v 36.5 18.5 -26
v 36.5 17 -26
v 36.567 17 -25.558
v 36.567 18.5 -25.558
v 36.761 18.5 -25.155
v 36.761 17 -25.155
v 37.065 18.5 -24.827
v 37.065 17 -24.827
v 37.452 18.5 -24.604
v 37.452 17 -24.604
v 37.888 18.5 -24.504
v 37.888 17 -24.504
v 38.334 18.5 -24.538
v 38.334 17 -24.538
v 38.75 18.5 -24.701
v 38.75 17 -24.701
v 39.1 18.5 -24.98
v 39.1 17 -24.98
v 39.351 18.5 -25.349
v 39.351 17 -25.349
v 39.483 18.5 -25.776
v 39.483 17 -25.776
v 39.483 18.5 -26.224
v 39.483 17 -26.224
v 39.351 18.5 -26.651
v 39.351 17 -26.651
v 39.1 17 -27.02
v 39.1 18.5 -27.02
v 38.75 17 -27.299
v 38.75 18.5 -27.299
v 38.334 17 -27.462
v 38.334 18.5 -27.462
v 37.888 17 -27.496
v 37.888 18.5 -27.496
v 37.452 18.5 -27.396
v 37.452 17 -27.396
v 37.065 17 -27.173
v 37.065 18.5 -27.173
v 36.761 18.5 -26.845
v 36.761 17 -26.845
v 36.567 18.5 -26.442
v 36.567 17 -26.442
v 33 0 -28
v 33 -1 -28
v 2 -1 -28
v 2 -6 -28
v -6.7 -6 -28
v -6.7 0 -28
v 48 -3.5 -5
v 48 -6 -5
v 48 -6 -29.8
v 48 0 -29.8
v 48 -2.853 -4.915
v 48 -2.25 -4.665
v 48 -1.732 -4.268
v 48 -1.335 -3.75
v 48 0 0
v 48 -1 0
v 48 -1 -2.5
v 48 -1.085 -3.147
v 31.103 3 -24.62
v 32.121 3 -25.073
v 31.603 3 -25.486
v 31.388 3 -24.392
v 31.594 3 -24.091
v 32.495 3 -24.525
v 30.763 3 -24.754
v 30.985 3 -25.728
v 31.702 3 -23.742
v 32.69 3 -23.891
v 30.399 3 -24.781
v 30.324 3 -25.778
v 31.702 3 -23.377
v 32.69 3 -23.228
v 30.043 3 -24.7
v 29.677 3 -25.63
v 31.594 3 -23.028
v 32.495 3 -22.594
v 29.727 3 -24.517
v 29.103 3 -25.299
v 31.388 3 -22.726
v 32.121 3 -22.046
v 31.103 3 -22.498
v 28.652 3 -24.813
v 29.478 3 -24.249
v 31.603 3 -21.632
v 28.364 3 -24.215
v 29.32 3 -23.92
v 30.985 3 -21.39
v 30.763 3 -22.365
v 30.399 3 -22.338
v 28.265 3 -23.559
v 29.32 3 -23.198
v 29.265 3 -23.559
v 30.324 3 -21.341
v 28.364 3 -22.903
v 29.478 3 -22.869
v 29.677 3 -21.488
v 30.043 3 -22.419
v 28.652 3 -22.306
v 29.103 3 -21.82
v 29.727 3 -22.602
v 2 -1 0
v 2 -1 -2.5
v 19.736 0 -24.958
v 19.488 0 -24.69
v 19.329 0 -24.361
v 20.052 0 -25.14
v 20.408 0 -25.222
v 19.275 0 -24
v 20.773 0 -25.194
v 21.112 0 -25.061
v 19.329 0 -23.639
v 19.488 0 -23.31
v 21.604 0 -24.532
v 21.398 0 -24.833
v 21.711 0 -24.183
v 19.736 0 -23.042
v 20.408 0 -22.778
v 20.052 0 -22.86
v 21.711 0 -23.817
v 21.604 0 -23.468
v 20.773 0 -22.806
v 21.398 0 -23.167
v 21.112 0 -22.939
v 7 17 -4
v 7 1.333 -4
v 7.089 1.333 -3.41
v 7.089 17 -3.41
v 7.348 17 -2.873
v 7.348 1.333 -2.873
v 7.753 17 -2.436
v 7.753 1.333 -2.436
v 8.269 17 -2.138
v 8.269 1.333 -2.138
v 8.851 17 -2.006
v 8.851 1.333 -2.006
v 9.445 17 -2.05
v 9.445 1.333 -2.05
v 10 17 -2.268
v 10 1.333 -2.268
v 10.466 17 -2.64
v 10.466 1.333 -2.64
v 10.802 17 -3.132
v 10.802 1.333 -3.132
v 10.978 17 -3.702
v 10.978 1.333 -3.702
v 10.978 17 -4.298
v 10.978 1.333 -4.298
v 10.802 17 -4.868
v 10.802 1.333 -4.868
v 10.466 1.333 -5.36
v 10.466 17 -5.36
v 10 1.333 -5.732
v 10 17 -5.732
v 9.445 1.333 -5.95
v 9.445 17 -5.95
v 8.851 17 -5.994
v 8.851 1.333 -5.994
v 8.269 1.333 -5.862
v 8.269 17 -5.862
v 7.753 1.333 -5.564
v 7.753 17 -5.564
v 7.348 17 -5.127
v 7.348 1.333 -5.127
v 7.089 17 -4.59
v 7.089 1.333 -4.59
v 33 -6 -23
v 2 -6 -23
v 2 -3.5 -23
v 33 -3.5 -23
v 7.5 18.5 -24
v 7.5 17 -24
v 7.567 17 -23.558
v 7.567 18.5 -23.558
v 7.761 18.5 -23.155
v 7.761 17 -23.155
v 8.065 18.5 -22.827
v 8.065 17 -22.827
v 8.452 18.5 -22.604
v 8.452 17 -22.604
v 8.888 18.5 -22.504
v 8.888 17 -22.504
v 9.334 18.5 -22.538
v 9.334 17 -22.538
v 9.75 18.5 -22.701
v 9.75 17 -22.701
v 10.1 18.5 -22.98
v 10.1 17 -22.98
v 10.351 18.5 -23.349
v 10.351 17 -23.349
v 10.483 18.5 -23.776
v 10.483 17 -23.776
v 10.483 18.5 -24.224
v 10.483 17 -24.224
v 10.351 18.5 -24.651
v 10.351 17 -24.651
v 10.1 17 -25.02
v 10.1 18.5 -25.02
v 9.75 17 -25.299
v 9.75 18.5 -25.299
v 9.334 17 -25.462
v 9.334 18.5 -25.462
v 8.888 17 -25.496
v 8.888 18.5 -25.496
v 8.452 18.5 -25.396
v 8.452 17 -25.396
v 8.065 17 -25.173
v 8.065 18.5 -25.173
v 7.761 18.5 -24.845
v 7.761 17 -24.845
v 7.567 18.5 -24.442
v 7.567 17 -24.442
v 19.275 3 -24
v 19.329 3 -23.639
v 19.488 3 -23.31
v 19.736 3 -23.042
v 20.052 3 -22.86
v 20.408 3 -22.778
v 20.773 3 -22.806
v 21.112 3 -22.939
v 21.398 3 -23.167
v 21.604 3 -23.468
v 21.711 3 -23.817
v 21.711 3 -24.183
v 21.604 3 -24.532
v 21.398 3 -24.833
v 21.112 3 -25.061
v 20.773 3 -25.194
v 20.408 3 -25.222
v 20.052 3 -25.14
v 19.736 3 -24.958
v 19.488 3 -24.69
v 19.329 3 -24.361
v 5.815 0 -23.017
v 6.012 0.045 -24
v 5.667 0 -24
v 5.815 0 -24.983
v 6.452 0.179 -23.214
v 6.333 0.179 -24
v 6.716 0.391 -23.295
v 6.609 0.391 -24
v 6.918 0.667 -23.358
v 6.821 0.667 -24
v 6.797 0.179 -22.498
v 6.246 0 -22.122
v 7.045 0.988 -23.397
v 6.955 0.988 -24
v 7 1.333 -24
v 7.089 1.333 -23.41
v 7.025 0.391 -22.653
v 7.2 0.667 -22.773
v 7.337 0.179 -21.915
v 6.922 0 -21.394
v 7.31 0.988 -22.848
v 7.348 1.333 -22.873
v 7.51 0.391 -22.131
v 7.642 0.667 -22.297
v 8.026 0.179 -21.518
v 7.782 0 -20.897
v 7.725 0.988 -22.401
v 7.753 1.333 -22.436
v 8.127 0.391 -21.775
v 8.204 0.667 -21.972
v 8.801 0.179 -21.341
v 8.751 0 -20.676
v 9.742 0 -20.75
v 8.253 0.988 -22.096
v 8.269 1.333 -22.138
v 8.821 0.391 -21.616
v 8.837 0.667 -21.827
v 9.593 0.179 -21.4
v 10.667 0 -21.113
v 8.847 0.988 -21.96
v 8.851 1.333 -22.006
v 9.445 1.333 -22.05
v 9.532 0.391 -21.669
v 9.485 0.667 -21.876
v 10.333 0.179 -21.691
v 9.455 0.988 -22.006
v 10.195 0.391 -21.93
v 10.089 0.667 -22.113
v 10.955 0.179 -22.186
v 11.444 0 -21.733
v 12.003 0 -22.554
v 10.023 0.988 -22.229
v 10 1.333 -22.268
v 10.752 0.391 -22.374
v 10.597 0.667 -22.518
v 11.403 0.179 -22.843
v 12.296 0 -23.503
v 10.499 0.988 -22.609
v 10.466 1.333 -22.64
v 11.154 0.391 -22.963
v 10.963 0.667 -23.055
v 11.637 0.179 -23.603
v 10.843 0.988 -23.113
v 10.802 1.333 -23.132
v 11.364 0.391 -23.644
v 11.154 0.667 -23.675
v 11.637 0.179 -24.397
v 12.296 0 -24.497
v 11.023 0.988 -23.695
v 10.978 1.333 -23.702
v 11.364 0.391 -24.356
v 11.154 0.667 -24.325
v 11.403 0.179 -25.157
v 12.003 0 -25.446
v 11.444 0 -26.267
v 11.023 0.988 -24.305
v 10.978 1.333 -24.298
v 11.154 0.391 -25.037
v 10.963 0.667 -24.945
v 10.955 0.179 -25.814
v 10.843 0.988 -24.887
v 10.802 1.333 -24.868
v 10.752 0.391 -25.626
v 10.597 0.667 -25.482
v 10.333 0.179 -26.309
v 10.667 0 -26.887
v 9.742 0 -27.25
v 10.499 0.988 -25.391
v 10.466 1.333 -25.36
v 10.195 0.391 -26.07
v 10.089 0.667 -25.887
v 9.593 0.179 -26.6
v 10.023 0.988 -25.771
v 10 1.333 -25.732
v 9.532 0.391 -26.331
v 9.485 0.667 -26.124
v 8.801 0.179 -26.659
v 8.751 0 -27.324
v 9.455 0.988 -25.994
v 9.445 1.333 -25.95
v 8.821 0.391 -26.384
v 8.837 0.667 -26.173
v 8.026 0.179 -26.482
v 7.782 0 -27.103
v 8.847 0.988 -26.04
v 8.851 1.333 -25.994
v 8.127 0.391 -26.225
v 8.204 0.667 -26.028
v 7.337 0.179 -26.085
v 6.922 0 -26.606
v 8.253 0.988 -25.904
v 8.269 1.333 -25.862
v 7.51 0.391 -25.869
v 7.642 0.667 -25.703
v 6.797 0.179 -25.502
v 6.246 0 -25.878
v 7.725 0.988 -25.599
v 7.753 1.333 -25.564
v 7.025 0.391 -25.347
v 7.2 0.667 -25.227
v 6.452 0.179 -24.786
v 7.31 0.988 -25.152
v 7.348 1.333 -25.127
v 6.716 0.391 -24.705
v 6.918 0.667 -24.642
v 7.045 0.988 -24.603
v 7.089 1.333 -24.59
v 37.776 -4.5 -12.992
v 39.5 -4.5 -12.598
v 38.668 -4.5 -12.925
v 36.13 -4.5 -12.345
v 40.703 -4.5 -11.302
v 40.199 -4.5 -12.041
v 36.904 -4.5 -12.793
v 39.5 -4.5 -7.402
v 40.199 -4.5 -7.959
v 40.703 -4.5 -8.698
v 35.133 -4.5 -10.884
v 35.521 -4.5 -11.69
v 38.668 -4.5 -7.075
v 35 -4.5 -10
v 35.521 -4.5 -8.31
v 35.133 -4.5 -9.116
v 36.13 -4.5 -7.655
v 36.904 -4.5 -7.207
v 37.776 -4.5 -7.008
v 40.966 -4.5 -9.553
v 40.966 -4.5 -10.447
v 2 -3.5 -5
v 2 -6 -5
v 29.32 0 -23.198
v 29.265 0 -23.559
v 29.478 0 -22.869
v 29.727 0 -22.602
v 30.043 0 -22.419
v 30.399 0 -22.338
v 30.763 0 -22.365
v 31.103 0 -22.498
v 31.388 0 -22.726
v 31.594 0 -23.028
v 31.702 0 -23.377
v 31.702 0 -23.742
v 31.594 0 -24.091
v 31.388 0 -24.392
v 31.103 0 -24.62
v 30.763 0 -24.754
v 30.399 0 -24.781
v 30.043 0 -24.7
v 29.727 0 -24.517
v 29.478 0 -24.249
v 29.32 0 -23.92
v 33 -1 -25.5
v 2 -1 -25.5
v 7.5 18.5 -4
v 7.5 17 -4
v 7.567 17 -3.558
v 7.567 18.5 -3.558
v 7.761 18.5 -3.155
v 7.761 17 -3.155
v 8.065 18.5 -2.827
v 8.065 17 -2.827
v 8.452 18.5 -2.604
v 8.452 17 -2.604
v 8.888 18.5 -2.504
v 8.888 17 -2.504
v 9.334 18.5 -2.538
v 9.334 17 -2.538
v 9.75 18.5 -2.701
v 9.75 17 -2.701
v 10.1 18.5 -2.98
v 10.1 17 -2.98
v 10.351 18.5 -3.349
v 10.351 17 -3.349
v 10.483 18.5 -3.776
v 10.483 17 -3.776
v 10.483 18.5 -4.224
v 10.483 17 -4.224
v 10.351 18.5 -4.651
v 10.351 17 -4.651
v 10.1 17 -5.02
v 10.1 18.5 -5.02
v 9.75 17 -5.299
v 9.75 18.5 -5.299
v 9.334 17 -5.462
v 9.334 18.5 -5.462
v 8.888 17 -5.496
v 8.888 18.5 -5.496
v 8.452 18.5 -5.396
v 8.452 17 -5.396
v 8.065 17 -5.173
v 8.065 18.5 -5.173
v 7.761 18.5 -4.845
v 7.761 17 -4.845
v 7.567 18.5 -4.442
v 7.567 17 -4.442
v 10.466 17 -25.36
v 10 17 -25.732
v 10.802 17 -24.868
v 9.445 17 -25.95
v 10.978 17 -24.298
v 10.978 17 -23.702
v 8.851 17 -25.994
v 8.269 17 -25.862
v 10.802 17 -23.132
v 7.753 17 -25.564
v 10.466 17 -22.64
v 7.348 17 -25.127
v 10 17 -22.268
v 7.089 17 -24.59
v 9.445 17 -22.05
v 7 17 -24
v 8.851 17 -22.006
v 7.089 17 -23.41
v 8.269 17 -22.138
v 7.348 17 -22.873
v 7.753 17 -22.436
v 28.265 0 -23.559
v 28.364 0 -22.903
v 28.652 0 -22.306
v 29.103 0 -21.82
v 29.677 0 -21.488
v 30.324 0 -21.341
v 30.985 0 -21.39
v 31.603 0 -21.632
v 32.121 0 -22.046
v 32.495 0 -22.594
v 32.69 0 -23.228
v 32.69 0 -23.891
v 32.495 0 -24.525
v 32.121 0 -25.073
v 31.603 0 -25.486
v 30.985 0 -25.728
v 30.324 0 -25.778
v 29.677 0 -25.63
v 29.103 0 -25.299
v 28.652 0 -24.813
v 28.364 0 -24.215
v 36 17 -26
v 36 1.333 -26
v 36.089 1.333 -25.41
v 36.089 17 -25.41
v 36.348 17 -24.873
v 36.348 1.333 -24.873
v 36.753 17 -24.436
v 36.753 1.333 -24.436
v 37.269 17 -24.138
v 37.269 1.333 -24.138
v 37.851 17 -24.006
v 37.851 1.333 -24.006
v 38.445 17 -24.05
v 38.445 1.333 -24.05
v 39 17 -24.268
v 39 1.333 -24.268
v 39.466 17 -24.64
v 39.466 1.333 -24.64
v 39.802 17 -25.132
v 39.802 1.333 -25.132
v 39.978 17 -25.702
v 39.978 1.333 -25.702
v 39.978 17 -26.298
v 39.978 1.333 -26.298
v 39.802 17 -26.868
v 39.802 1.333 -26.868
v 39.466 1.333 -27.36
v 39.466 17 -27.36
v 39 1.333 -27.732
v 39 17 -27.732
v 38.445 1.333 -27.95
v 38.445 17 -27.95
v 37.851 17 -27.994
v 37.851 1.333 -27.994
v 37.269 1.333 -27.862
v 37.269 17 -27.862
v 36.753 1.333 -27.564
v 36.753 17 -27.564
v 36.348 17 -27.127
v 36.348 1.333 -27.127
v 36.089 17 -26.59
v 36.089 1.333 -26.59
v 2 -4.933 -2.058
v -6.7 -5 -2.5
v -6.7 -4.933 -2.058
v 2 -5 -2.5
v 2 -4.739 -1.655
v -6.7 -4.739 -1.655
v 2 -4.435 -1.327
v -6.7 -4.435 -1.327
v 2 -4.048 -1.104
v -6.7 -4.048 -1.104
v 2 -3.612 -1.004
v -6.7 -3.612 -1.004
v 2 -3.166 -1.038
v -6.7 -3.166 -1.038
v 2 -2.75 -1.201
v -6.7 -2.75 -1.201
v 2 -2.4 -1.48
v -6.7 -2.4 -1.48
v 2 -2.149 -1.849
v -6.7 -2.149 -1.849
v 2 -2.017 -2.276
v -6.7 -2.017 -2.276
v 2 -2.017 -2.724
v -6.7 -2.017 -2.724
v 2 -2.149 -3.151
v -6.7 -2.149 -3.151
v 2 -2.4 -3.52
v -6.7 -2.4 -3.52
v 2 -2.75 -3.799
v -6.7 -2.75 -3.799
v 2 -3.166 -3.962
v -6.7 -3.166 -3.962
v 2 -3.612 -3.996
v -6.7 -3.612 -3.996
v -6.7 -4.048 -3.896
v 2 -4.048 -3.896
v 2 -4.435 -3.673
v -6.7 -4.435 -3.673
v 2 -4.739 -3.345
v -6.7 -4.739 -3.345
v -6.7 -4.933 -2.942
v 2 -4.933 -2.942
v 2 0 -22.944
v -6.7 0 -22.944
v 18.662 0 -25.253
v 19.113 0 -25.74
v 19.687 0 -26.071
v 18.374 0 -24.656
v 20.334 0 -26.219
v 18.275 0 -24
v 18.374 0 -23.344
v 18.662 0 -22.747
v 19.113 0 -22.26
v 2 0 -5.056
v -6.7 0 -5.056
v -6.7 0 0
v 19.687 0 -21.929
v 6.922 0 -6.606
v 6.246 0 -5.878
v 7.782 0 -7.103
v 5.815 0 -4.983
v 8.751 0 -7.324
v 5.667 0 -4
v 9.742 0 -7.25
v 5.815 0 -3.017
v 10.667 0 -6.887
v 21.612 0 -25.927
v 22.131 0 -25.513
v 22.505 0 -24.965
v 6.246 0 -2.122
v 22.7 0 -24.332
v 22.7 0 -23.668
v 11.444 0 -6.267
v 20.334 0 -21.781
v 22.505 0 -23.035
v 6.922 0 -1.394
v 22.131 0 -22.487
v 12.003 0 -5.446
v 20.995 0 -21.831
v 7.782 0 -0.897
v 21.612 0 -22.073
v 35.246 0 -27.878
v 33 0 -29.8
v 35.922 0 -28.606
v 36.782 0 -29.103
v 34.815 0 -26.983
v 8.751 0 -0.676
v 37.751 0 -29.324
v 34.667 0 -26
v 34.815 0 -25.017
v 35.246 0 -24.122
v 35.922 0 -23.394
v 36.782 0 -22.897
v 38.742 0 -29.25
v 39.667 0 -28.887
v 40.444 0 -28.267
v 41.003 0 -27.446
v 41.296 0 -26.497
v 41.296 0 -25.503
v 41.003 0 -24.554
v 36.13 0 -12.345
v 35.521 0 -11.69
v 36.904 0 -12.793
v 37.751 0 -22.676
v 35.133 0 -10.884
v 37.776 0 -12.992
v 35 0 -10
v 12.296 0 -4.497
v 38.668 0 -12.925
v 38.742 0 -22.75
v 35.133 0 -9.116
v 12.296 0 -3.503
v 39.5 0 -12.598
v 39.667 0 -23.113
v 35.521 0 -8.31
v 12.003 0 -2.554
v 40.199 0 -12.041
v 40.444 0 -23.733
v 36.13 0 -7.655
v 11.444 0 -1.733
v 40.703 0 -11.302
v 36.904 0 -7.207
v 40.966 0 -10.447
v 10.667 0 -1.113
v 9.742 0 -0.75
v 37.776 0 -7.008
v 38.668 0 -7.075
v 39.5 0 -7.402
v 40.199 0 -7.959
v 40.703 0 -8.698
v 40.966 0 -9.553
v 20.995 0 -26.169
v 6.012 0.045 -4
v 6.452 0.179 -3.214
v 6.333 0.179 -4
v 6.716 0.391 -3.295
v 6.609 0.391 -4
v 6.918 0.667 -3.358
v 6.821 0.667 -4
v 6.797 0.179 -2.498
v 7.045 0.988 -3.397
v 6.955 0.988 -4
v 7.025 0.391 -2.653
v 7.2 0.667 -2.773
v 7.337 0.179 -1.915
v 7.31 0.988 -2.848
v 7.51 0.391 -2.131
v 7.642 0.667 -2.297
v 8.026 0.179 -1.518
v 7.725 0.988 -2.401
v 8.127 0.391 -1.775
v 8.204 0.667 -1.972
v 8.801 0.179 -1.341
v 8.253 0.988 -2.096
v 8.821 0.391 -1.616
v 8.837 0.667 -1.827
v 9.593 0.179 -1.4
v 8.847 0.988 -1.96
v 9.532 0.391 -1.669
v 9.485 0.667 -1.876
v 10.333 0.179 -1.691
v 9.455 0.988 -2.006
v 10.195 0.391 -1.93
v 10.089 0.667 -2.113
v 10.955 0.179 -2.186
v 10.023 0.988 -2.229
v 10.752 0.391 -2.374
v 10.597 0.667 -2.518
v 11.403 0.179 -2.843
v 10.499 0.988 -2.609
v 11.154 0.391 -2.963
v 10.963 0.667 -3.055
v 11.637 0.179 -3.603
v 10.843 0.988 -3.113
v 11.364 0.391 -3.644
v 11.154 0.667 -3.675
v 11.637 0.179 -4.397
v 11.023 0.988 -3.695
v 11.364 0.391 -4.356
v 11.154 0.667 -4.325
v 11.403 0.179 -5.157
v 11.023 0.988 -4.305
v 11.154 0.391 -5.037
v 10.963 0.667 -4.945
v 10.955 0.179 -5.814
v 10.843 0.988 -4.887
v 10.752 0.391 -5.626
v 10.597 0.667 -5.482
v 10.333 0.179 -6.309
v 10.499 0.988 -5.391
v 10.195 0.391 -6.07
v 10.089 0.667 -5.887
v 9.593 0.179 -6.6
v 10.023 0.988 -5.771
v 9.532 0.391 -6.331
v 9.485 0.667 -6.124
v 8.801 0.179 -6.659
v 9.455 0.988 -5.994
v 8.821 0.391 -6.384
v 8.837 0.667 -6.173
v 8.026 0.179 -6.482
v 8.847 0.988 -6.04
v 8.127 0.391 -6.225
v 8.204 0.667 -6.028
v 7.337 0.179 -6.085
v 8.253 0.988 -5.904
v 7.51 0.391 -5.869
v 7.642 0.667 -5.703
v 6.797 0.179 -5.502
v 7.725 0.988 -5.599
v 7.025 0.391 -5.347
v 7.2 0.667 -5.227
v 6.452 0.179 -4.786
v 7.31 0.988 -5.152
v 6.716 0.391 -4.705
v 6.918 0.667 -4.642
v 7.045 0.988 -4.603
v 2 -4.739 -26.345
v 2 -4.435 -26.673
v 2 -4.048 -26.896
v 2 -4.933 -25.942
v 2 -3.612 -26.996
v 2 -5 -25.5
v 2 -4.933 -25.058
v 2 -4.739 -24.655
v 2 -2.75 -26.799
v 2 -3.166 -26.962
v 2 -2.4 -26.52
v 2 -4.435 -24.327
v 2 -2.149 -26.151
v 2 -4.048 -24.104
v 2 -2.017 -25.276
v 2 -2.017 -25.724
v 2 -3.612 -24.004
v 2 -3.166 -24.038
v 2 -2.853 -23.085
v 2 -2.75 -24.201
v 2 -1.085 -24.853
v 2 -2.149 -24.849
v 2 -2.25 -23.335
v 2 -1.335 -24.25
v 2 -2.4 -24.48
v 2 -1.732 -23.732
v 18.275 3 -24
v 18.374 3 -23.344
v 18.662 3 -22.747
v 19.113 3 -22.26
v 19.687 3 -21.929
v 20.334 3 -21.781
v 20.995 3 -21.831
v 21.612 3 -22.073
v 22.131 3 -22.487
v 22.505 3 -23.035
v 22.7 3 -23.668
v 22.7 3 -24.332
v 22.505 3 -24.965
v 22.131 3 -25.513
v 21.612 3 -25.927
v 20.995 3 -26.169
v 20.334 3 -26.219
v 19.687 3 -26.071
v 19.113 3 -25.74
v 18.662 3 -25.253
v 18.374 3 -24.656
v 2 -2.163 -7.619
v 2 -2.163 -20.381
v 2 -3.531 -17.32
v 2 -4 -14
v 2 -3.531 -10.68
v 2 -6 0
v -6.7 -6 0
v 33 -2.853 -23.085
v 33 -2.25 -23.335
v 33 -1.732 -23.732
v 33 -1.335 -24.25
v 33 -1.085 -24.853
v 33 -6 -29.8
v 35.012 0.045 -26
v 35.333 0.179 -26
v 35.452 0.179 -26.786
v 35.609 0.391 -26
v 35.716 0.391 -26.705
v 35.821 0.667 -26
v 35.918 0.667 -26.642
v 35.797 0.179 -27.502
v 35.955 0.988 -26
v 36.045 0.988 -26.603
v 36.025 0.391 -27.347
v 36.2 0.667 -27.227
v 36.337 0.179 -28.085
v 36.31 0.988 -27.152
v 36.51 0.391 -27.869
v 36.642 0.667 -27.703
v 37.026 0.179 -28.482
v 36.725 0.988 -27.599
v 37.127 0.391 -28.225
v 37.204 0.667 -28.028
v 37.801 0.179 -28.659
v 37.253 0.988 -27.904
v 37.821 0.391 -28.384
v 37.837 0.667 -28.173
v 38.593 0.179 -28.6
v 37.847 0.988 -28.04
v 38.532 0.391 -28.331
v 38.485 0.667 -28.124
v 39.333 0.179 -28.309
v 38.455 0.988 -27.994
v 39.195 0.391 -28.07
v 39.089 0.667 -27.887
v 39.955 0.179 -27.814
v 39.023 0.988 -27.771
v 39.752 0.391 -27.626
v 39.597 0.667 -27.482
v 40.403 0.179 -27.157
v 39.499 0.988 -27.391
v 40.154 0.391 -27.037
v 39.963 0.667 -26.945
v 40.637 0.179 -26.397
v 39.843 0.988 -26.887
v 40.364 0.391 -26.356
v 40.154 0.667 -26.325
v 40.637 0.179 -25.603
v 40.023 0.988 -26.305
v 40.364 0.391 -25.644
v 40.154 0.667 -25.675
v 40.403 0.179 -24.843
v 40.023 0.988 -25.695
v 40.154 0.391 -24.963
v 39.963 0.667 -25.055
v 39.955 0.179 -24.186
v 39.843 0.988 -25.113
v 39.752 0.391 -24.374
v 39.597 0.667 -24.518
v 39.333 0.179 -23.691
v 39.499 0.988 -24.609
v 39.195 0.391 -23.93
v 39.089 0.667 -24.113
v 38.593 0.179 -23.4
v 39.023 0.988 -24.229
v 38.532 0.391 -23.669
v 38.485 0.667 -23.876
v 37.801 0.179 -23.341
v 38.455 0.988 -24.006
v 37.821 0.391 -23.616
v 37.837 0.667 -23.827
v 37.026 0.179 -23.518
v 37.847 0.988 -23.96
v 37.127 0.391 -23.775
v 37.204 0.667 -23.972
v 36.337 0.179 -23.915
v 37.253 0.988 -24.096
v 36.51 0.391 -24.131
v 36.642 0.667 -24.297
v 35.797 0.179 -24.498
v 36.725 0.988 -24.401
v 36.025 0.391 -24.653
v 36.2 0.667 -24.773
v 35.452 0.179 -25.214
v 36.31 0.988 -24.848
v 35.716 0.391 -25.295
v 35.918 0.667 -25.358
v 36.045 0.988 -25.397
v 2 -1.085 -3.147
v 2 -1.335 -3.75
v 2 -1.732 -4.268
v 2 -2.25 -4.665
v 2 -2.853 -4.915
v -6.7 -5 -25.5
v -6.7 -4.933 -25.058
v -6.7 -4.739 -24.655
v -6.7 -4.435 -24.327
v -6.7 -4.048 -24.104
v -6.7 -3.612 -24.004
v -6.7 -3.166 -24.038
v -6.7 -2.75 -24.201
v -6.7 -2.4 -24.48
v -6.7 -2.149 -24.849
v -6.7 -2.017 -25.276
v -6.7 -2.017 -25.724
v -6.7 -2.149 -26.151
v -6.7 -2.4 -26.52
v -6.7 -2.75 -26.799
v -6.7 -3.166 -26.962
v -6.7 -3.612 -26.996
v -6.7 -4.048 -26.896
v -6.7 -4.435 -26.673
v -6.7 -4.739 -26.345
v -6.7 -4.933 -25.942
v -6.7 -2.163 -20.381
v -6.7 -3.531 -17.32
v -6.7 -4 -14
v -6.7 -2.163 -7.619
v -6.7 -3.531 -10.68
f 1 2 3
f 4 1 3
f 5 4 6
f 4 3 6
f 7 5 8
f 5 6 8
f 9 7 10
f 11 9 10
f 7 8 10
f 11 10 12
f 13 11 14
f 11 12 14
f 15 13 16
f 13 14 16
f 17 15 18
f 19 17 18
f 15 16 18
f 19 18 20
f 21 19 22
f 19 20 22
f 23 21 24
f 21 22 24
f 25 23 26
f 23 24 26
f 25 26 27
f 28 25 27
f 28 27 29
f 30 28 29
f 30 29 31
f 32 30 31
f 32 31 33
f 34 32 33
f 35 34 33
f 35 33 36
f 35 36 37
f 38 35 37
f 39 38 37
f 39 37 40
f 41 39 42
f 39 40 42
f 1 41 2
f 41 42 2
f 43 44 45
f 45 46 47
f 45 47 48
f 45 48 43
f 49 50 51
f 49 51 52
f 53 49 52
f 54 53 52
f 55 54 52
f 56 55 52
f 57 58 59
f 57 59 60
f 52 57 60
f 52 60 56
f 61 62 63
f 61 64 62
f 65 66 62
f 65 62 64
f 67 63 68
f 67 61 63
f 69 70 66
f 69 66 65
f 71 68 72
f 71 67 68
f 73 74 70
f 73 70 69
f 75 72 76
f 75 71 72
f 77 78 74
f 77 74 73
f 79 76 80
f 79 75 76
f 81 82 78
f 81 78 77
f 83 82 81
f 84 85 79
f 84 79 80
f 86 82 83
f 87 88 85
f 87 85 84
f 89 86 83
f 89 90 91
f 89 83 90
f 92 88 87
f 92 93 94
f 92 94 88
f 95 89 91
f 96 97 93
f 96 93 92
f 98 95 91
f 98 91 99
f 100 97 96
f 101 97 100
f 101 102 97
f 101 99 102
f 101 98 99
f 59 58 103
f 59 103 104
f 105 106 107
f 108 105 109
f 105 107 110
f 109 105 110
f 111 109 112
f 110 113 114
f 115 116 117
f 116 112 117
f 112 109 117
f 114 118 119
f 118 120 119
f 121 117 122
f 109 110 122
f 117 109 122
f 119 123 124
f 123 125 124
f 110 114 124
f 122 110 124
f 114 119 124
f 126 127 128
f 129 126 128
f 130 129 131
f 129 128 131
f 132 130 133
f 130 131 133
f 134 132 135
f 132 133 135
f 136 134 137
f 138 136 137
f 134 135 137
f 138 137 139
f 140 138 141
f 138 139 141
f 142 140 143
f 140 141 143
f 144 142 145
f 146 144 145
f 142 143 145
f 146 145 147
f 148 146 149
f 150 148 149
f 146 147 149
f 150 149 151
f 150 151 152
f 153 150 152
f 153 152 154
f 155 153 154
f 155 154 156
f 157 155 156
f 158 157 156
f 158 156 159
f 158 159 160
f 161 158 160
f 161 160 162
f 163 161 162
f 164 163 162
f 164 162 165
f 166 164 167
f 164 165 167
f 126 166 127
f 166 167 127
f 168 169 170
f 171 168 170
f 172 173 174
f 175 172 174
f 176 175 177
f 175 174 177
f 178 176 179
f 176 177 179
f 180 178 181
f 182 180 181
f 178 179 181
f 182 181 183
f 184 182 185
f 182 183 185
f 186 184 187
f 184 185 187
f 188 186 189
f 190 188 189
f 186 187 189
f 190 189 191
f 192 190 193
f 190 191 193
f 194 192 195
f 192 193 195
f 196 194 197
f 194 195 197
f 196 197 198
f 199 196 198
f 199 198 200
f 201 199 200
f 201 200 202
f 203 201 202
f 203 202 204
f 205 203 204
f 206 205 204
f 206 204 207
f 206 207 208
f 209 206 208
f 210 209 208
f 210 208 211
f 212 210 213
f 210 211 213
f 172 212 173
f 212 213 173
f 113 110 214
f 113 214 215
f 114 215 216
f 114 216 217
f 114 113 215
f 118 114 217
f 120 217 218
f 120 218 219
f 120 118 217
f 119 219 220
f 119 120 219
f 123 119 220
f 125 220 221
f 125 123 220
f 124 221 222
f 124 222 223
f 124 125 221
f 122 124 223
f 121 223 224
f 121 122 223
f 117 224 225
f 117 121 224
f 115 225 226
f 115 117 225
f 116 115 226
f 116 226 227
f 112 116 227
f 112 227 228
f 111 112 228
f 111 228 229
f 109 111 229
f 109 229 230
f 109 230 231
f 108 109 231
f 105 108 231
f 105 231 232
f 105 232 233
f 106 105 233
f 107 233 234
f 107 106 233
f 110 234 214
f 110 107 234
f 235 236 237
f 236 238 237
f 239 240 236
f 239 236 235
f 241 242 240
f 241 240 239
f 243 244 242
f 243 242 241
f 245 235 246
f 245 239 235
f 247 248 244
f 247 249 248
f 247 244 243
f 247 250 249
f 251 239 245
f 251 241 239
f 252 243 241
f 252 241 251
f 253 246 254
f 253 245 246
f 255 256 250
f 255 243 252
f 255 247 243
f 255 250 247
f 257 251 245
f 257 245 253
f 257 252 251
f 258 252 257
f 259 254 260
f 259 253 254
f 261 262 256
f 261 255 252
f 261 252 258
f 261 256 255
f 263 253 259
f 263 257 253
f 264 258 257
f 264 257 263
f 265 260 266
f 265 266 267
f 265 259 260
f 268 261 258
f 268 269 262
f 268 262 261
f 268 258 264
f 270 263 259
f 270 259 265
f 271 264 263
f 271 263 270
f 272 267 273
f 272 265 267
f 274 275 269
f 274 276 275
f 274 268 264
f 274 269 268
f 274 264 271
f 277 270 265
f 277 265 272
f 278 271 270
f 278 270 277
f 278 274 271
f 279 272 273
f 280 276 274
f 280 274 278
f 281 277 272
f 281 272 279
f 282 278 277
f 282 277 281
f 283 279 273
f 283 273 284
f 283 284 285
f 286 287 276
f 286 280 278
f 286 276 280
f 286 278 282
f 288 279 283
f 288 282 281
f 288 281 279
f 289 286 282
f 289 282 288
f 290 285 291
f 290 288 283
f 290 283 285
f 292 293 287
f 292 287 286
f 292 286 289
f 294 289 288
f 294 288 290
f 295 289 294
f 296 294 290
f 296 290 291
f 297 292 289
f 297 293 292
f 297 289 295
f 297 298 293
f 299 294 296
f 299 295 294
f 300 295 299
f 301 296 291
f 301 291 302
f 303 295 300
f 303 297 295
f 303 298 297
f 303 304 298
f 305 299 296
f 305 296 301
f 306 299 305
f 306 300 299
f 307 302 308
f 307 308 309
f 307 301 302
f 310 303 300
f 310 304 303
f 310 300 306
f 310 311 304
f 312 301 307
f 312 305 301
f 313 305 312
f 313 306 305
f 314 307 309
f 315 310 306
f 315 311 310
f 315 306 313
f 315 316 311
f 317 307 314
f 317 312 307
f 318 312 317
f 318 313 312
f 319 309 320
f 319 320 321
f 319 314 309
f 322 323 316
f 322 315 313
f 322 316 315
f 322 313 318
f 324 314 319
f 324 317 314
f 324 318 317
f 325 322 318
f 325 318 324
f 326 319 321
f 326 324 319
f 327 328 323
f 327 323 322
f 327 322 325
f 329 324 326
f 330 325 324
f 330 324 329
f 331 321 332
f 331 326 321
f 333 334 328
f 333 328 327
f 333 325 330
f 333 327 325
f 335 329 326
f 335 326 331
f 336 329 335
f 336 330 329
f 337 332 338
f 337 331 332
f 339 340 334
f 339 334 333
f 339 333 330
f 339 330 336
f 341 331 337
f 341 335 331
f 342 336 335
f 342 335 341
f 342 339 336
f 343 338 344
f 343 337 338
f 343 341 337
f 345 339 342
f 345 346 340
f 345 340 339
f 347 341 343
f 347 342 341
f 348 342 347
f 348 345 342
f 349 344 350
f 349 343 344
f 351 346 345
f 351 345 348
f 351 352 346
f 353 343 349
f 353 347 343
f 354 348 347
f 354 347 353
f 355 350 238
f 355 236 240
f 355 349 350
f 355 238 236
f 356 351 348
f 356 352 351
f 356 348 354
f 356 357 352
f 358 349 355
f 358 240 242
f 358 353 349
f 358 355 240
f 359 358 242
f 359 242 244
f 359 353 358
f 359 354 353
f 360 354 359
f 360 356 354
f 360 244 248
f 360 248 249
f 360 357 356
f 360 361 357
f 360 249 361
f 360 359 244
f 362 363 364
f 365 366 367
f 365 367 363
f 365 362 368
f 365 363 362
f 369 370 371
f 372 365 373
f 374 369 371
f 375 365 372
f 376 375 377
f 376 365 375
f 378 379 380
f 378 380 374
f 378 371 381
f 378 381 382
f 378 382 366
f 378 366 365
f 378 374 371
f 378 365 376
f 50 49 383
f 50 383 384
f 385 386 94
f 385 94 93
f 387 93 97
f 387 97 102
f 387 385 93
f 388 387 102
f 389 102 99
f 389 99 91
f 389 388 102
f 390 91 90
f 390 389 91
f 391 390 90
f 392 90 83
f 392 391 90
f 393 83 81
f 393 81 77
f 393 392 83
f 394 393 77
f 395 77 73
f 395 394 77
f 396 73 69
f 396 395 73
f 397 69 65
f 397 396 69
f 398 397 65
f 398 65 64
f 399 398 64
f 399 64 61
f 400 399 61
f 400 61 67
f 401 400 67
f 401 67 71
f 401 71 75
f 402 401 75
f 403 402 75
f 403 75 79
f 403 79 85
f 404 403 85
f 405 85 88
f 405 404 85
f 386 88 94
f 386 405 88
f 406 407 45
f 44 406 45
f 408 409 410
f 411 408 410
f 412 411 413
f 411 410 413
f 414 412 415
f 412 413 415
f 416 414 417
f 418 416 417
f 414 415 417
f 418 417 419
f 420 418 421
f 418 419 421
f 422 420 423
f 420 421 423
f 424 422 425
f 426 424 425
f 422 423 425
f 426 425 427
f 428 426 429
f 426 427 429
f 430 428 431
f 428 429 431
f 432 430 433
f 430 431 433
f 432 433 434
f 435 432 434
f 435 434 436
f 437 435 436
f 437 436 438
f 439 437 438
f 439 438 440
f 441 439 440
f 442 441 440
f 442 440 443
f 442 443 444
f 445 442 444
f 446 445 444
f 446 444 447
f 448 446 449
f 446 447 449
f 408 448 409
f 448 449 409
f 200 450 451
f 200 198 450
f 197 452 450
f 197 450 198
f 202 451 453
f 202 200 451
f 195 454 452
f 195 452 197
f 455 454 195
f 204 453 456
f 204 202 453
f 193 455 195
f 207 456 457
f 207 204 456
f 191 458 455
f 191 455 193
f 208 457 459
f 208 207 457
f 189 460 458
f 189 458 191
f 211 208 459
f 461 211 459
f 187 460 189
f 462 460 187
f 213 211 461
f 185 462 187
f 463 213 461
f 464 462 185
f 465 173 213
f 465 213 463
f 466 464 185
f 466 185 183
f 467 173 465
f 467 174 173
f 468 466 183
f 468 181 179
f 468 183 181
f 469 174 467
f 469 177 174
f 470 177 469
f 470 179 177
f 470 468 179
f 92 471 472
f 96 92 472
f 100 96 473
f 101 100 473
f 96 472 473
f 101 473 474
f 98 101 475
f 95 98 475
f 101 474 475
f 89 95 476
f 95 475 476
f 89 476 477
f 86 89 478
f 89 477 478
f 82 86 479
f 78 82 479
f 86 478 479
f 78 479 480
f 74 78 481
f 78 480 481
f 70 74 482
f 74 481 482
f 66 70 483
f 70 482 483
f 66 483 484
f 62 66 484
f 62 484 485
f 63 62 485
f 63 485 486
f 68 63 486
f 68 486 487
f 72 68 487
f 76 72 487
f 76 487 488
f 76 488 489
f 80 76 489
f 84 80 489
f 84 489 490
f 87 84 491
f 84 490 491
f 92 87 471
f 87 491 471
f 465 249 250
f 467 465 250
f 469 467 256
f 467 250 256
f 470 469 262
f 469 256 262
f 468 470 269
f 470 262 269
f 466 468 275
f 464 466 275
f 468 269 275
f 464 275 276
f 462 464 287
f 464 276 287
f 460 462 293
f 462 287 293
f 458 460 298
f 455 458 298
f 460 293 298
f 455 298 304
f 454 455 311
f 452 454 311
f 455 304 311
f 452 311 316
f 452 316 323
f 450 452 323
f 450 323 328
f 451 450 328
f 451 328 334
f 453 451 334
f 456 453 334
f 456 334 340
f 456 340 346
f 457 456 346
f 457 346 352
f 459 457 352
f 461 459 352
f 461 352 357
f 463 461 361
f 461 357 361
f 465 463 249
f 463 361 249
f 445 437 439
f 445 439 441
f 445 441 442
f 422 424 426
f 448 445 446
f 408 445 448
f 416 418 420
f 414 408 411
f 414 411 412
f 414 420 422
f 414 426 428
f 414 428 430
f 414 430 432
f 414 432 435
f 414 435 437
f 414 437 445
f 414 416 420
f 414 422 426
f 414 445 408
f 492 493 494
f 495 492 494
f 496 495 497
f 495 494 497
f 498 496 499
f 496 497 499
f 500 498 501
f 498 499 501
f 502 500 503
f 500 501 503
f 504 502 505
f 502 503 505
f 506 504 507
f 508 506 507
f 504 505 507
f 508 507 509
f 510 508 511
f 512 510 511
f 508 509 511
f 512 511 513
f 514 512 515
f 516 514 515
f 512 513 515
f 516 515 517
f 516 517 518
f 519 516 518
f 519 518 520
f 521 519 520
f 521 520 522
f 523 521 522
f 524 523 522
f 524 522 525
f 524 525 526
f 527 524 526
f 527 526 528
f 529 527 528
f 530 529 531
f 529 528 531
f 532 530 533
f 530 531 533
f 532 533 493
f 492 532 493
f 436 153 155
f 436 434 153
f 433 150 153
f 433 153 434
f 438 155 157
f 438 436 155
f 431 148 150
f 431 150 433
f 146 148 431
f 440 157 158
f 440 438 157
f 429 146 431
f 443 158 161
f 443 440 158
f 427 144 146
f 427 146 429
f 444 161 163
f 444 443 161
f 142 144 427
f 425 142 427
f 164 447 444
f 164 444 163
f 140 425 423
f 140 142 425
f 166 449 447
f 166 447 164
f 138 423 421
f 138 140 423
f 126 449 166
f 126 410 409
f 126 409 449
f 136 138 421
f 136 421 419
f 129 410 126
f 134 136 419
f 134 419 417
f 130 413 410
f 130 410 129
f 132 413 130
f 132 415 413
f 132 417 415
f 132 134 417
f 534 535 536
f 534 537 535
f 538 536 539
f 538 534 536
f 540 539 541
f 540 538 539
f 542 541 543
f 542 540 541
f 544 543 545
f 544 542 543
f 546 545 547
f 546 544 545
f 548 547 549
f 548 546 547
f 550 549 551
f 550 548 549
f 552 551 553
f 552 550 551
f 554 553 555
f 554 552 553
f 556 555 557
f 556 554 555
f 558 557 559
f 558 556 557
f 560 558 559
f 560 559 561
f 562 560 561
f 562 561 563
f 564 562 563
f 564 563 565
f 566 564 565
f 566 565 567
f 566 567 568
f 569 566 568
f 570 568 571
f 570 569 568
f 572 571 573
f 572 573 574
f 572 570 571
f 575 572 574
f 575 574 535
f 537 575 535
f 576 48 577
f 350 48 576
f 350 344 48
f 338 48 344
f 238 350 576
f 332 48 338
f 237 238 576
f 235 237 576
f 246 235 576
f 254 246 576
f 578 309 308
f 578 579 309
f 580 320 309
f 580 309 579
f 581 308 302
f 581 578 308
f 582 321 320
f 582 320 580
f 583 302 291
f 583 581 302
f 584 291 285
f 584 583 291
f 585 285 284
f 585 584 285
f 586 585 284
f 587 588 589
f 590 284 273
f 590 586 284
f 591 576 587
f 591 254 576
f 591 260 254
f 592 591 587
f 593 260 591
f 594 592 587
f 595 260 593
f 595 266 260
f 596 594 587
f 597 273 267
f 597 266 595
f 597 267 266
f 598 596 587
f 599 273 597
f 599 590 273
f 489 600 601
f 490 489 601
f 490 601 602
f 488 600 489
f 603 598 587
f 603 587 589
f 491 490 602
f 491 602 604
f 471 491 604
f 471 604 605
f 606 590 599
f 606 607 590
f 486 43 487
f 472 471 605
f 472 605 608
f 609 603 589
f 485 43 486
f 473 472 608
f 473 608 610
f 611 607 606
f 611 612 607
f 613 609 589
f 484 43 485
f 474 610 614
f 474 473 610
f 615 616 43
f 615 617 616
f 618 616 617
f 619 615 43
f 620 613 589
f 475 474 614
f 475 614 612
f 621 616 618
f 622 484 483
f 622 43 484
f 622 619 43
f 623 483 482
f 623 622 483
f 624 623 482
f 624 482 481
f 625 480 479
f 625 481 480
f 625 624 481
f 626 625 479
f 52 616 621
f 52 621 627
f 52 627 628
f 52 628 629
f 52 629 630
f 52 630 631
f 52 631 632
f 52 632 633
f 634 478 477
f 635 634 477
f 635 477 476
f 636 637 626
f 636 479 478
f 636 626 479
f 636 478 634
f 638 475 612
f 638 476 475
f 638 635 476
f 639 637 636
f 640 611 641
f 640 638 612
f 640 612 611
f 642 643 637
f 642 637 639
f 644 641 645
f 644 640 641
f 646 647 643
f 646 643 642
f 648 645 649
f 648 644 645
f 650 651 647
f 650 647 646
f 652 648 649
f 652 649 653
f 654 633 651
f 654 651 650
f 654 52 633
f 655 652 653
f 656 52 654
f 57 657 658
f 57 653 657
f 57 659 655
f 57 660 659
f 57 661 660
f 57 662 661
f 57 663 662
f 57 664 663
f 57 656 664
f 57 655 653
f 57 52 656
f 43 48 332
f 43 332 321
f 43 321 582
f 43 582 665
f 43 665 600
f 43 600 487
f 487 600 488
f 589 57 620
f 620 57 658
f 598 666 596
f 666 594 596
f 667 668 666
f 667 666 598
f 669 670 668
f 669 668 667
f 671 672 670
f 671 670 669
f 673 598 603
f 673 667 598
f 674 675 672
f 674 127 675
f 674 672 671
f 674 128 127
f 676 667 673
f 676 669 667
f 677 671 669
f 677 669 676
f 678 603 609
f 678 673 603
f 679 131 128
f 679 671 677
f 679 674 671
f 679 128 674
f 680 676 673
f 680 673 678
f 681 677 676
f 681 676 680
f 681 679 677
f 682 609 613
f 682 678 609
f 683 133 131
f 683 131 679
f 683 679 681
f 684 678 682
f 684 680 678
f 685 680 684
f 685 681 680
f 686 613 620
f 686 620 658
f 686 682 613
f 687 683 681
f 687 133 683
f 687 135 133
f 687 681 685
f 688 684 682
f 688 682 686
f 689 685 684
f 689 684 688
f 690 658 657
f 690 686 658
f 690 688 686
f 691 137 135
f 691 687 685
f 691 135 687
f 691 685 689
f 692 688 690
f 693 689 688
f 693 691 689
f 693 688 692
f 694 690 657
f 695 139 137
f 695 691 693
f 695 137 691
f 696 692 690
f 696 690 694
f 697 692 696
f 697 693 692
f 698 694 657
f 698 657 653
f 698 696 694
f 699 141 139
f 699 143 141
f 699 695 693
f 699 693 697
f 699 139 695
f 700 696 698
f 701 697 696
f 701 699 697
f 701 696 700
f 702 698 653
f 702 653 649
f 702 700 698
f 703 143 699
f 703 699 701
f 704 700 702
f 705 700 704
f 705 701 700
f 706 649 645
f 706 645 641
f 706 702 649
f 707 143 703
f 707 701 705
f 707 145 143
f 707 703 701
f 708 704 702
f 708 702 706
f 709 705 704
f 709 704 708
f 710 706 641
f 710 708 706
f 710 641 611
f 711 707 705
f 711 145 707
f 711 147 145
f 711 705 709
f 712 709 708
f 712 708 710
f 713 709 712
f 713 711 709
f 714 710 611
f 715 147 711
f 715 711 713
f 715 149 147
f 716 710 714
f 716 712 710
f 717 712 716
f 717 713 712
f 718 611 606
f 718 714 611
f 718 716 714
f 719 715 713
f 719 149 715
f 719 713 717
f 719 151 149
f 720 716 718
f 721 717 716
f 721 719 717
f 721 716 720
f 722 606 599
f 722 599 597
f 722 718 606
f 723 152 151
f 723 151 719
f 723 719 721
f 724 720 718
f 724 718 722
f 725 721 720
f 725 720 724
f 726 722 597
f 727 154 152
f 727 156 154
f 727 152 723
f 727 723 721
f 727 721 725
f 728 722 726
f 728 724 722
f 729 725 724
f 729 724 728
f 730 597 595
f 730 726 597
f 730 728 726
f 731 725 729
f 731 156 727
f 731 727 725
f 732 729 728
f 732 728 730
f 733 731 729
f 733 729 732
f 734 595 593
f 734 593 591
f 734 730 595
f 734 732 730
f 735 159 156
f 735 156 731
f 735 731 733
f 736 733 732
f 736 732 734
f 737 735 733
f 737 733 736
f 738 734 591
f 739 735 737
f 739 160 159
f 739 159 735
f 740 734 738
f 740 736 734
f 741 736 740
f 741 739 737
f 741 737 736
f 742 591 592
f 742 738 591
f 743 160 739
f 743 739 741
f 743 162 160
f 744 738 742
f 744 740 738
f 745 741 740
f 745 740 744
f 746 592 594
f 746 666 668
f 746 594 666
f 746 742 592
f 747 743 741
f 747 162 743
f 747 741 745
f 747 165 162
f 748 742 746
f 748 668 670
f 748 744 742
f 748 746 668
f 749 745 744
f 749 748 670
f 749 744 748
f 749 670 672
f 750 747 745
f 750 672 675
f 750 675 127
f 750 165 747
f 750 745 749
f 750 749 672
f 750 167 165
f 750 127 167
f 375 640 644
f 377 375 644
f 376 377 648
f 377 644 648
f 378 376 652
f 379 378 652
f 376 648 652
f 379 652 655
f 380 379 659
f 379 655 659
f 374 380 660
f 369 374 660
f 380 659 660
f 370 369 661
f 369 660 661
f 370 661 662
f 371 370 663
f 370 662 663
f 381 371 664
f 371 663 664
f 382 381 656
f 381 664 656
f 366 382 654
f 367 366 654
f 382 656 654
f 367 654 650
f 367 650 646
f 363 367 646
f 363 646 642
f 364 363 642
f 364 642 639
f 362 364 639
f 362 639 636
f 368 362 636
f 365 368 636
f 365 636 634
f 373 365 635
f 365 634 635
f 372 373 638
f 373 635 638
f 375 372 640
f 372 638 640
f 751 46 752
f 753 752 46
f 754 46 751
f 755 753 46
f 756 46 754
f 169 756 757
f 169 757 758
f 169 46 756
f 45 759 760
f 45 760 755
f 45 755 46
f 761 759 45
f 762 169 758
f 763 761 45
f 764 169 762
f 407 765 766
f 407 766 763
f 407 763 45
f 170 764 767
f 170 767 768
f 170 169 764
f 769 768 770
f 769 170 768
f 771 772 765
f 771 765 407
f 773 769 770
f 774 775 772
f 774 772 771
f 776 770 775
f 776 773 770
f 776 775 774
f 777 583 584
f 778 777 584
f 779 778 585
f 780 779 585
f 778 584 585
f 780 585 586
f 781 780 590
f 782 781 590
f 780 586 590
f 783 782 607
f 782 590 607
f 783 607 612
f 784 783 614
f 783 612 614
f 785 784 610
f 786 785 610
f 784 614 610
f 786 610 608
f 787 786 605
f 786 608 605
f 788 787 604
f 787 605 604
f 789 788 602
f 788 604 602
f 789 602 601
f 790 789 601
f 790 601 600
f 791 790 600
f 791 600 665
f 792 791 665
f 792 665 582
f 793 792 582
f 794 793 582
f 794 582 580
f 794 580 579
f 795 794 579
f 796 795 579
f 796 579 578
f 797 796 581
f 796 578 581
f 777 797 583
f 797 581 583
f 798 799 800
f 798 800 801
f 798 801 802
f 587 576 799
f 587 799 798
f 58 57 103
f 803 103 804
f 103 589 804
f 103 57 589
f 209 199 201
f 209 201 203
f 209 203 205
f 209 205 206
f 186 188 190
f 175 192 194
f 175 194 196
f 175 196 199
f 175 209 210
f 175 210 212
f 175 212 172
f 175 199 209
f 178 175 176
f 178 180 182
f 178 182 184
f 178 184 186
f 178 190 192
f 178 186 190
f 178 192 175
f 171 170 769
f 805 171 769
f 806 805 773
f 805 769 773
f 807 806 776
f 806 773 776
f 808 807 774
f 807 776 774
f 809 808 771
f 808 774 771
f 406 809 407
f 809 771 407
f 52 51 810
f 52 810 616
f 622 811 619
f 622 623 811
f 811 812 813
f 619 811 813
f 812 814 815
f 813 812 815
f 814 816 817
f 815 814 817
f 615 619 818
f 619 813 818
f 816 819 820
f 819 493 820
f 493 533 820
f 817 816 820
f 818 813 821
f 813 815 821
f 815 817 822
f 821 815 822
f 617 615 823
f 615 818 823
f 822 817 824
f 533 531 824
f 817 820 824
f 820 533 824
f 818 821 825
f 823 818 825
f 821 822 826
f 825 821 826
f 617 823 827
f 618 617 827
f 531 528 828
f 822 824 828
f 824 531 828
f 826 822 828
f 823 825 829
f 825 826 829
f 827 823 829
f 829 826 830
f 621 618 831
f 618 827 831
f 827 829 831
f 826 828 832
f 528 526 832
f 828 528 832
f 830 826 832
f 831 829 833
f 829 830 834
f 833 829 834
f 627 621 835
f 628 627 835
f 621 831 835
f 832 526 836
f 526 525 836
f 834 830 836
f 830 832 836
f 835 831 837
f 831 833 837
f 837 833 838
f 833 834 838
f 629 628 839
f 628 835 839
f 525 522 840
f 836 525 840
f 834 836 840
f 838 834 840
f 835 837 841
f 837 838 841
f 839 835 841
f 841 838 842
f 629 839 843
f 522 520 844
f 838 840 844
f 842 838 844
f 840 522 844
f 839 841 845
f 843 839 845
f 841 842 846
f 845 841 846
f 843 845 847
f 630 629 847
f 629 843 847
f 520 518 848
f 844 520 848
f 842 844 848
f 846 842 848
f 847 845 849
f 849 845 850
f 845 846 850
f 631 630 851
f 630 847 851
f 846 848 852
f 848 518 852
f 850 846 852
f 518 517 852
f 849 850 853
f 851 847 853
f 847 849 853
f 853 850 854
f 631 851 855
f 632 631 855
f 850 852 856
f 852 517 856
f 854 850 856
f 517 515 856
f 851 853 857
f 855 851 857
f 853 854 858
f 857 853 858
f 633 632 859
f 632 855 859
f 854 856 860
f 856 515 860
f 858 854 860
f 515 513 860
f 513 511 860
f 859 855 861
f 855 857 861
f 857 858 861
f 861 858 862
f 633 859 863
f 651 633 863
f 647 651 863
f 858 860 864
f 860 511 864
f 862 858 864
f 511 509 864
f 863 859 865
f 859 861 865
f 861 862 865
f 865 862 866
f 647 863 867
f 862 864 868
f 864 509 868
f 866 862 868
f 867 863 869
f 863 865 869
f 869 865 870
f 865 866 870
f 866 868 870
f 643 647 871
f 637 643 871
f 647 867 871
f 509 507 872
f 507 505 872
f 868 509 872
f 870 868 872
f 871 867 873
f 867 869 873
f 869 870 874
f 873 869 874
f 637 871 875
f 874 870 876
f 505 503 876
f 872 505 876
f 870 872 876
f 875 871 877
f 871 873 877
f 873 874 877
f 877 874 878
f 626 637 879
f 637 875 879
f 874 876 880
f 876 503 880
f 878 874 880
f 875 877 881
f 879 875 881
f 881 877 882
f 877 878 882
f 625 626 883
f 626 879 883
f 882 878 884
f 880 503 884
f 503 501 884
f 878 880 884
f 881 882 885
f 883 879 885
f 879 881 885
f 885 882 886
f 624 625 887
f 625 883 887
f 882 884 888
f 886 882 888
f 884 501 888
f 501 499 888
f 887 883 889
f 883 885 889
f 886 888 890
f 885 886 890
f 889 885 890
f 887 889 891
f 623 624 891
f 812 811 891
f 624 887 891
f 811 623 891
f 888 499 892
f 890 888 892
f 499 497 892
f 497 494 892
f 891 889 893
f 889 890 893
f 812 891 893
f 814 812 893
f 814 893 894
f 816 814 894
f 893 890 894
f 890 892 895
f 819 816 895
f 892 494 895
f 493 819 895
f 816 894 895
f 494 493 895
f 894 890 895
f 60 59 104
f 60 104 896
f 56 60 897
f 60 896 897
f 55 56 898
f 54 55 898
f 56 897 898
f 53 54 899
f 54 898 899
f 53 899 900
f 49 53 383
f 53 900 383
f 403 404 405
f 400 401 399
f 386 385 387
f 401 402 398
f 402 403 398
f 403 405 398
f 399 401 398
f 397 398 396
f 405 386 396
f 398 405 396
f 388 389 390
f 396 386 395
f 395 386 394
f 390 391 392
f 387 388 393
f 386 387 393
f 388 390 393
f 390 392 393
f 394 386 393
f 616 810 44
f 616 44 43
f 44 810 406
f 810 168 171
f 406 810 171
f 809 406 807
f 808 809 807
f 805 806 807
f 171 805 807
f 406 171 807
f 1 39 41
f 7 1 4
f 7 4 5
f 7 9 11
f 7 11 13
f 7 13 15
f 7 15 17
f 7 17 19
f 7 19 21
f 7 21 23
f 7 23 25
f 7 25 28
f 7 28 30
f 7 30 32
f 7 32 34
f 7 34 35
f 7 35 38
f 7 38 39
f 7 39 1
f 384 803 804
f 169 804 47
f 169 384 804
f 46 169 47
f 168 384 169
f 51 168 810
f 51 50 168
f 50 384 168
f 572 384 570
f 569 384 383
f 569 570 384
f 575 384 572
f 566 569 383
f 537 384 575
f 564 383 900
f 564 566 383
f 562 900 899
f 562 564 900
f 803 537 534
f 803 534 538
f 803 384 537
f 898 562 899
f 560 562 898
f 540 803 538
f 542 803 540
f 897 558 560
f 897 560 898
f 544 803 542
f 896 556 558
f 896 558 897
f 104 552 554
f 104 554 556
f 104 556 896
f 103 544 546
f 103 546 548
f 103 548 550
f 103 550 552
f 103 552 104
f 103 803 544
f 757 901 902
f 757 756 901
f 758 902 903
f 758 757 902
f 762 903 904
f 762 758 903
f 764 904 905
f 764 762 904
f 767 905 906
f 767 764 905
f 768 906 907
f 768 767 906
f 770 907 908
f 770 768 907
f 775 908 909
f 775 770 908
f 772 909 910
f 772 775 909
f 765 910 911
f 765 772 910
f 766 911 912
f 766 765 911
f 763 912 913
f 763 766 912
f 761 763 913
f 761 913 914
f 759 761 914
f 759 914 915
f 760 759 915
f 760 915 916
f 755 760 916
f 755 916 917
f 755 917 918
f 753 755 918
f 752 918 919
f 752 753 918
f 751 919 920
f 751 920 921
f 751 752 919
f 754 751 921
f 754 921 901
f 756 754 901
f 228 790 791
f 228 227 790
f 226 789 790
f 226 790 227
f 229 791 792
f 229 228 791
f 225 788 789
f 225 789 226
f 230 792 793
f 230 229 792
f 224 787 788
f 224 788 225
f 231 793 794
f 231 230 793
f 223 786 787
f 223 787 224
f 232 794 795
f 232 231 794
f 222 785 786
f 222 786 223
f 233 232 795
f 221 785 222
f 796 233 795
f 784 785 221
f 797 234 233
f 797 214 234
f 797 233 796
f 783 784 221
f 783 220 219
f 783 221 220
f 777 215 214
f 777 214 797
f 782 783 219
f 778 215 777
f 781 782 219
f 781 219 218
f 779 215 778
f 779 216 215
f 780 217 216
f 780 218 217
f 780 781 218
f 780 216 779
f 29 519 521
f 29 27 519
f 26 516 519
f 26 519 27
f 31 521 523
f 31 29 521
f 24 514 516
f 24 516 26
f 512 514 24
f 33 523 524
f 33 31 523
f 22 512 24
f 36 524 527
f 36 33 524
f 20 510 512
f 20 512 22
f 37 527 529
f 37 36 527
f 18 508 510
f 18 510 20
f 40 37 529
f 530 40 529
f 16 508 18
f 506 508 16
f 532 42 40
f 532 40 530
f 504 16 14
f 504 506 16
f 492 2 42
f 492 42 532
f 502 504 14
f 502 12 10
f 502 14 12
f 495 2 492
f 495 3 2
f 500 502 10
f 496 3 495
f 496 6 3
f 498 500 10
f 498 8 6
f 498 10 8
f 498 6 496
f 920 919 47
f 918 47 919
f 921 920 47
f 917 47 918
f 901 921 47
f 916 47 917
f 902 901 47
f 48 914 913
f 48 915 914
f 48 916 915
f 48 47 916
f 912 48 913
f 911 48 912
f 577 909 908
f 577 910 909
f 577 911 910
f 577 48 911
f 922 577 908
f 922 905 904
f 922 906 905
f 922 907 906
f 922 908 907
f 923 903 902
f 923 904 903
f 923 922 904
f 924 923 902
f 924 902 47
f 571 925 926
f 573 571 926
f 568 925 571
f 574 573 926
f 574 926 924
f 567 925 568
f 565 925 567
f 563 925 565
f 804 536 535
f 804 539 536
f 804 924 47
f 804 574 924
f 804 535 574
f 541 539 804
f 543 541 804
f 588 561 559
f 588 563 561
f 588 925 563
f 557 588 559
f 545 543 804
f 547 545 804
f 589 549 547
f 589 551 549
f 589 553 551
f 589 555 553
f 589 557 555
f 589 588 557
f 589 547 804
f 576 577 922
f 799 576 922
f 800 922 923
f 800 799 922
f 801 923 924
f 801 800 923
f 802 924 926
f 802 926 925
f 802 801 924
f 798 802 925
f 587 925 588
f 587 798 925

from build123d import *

# Parameters (mm, degrees)
F0_W      = 40
F0_H      = 28
F1_DEPTH  = 6
F3_DEPTH  = 38
F4_R      = 1.5
F5_DEPTH  = 2
F7_R      = 2.225
F7_R_2    = 1.225
F8_DEPTH  = 3
F9_R      = 2
F10_DEPTH = 17
F11_R     = 1.5
F12_DEPTH = 1.5
F13_DEPTH = 6.7
F15_DEPTH = 8
F16_R     = 3
F17_DEPTH = 4.5
F19_DEPTH = 15
F20_R     = 1.3333333333


with BuildPart() as f1:
    # F0 (on Front) → F1 (new body)
    with BuildSketch(Plane.XZ):
        with Locations((20, -14)):
            Rectangle(F0_W, F0_H)
    extrude(amount=F1_DEPTH)

    # F2 (on face) → F3 (cut, through all)
    with BuildSketch(Plane.YZ.offset(40)):
        with BuildLine():
            Line((-6, -23), (-6, -28))
            Line((-6, -28), (-1, -28))
            Line((-1, -28), (-1, -25.5))
            ThreePointArc((-1, -25.5), (-1.732233047, -23.732233047), (-3.5, -23))
            Line((-3.5, -23), (-6, -23))
        make_face()
        with BuildLine():
            Line((-6, 0), (-6, -5))
            Line((-6, -5), (-3.5, -5))
            ThreePointArc((-3.5, -5), (-1.732233047, -4.267766953), (-1, -2.5))
            Line((-1, -2.5), (-1, 0))
            Line((-1, 0), (-6, 0))
        make_face()
    extrude(amount=-F3_DEPTH, mode=Mode.SUBTRACT)

    # F4 (on face) → F5 (cut)
    with BuildSketch(Plane(origin=(0, 0, 0), x_dir=(0, -1, 0), z_dir=(-1, 0, 0))):
        with Locations((3.5, -25.5)):
            Circle(F4_R)
        with BuildLine():
            ThreePointArc((0, -22.94427191), (4, -14), (0, -5.05572809))
            Line((0, -5.05572809), (0, -22.94427191))
        make_face()
        with Locations((3.5, -2.5)):
            Circle(F4_R)
    extrude(amount=-F5_DEPTH, mode=Mode.SUBTRACT)

    # F7 (on face) → F8 (join)
    with BuildSketch(Plane(origin=(0, 0, 0), x_dir=(-1, 0, 0), z_dir=(0, 1, 0))):
        with Locations((-20.5, -24)):
            Circle(F7_R)
        with Locations((-20.5, -24)):
            Circle(F7_R_2, mode=Mode.SUBTRACT)
        with Locations((-30.4902837155, -23.5592832158)):
            Circle(F7_R)
        with Locations((-30.4902837155, -23.5592832158)):
            Circle(F7_R_2, mode=Mode.SUBTRACT)
    extrude(amount=F8_DEPTH)

    # F9 (on face) → F10 (join)
    with BuildSketch(Plane(origin=(0, 0, 0), x_dir=(-1, 0, 0), z_dir=(0, 1, 0))):
        with Locations((-38, -26)):
            Circle(F9_R)
        with Locations((-9, -24)):
            Circle(F9_R)
        with Locations((-9, -4)):
            Circle(F9_R)
    extrude(amount=F10_DEPTH)

    # F11 (on face) → F12 (join)
    with BuildSketch(Plane(origin=(0, 17, 0), x_dir=(-1, 0, 0), z_dir=(0, 1, 0))):
        with Locations((-38, -26)):
            Circle(F11_R)
        with Locations((-9, -24)):
            Circle(F11_R)
        with Locations((-9, -4)):
            Circle(F11_R)
    extrude(amount=F12_DEPTH)

    # F13 (add): a face of the model
    f13_faces = [f1.faces().sort_by_distance(p)[0] for p in [
        (0, -0.2863564213, -2.527864045),
    ]]
    extrude(f13_faces, amount=F13_DEPTH)

    # F14 (on face) → F15 (join)
    with BuildSketch(Plane.YZ.offset(40)):
        with BuildLine():
            Line((0, 0), (-1, 0))
            Line((-1, 0), (-1, -2.5))
            ThreePointArc((-1, -2.5), (-1.732233047, -4.267766953), (-3.5, -5))
            Line((-3.5, -5), (-6, -5))
            Line((-6, -5), (-6, -23))
            Line((-6, -23), (-3.5, -23))
            ThreePointArc((-3.5, -23), (-1.732233047, -23.732233047), (-1, -25.5))
            Line((-1, -25.5), (-1, -28))
            Line((-1, -28), (0, -28))
            Line((0, -28), (0, 0))
        make_face()
    extrude(amount=F15_DEPTH)

    # F16 (on face) → F17 (cut)
    with BuildSketch(Plane(origin=(0, 0, 0), x_dir=(-1, 0, 0), z_dir=(0, 1, 0))):
        with Locations((-38, -10)):
            Circle(F16_R)
    extrude(amount=-F17_DEPTH, mode=Mode.SUBTRACT)

    # F18 (on face) → F19 (join)
    with BuildSketch(Plane.YZ.offset(48)):
        with BuildLine():
            Line((-3.5, -23), (-6, -23))
            Line((-6, -23), (-6, -29.8))
            Line((-6, -29.8), (0, -29.8))
            Line((0, -29.8), (0, -28))
            Line((0, -28), (-1, -28))
            Line((-1, -28), (-1, -25.5))
            ThreePointArc((-1, -25.5), (-1.732233047, -23.732233047), (-3.5, -23))
        make_face()
    extrude(amount=-F19_DEPTH)

    # F20
    f20_edges = [f1.edges().sort_by_distance(p)[0] for p in [
        (40, 0, -26),
        (11, 0, -24),
        (11, 0, -4),
    ]]
    fillet(f20_edges, radius=F20_R)


solid = f1.part
